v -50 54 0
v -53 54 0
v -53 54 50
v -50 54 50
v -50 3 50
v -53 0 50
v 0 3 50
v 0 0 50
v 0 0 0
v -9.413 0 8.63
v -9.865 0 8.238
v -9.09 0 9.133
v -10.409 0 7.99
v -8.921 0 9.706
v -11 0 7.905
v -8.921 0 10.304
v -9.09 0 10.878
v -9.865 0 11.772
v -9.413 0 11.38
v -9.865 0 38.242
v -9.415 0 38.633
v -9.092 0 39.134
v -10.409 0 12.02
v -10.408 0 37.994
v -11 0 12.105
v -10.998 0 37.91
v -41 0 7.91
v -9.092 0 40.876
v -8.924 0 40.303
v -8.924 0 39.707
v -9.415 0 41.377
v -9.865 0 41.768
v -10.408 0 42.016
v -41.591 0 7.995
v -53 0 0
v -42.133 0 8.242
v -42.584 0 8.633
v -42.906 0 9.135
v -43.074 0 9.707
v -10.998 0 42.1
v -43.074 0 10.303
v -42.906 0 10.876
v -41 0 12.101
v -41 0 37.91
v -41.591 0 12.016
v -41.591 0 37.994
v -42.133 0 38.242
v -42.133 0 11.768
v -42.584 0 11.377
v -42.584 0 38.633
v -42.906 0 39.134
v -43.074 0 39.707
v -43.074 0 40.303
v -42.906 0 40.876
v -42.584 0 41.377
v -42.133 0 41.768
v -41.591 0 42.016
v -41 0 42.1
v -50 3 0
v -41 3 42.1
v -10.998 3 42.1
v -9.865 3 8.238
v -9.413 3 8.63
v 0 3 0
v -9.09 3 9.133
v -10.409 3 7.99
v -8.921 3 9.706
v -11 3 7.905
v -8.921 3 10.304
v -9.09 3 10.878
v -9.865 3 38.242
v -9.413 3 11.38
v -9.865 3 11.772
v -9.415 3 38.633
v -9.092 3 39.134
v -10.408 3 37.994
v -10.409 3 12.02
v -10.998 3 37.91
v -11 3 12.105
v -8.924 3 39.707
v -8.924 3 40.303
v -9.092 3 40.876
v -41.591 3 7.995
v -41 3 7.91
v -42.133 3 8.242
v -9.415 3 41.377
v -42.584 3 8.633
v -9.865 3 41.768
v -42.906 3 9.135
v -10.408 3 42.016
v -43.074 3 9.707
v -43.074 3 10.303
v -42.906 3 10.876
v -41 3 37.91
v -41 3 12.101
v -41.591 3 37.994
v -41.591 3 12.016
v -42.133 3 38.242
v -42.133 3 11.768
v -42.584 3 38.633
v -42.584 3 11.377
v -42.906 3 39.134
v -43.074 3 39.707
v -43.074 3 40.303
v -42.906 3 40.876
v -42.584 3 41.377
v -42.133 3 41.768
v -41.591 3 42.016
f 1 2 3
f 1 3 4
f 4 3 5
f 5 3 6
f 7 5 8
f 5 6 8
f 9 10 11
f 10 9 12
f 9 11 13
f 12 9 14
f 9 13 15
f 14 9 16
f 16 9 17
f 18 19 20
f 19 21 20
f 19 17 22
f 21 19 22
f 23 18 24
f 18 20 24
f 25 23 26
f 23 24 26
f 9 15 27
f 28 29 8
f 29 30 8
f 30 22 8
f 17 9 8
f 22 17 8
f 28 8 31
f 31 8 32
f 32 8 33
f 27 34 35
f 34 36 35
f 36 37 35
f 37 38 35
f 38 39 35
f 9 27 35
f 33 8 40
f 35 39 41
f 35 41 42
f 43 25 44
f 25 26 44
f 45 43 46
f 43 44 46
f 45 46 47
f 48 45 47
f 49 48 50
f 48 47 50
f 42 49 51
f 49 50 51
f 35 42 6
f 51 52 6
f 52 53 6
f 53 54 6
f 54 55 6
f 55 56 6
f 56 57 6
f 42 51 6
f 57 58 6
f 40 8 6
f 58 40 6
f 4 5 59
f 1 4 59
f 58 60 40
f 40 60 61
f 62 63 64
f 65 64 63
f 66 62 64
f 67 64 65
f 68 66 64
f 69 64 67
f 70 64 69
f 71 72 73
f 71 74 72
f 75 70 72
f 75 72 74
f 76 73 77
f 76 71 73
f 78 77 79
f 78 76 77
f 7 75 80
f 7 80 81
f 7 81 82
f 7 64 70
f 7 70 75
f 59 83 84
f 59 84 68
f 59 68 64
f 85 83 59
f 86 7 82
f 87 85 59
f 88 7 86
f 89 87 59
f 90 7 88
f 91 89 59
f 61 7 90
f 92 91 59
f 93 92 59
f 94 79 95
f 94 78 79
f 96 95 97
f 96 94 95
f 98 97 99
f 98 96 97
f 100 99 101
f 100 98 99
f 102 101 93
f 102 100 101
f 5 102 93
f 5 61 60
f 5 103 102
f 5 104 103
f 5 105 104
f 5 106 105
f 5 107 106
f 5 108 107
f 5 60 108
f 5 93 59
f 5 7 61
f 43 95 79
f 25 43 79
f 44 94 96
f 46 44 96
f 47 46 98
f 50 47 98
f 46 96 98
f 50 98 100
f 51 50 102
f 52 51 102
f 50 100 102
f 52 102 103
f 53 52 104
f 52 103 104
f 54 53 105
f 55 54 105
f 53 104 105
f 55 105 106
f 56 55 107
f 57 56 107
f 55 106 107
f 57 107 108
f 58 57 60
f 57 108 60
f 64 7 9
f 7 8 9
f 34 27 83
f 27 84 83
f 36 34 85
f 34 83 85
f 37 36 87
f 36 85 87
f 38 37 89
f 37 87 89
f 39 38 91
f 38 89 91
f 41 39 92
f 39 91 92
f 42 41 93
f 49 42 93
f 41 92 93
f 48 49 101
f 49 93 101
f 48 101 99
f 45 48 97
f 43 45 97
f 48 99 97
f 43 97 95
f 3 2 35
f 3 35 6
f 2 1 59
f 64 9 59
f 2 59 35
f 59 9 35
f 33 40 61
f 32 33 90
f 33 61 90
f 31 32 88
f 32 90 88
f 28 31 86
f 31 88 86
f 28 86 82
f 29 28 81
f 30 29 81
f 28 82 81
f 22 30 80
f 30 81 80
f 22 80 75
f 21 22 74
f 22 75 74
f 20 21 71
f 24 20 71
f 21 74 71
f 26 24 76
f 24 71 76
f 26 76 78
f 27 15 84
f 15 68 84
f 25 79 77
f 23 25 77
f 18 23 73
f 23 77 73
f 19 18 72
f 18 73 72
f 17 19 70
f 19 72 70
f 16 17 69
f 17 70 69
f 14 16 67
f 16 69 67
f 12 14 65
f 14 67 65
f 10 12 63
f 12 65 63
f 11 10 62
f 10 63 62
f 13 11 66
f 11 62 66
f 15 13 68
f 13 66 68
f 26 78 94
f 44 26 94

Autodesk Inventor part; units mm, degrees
ref_plane "YZ Plane" through (0, 0, 0) normal (1, 0, 0) x (0, 1, 0)
ref_plane "XZ Plane" through (0, 0, 0) normal (0, 1, 0) x (-1, 0, 0)
ref_plane "XY Plane" through (0, 0, 0) normal (0, 0, 1) x (1, 0, 0)
sketch "Sketch1" plane through (0, 0, 0) normal (0, 1, 0) x (-1, 0, 0)
  line L0 (0, 0) -> (52.9999, 0)
  line L1 (52.9999, 0) -> (52.9999, 49.9999)
  line L2 (52.9999, 49.9999) -> (0, 49.9999)
  line L3 (0, 49.9999) -> (0, 0)
  dimension "d0" = 52.9999
  dimension "d1" = 49.9999
extrude "Extrusion1" add sketch "Sketch1" along normal blind 3
sketch "Sketch2" plane through (0, 3, 0) normal (0, 1, 0) x (1, 0, 0)
  line L0 (-52.9999, 0) -> (-52.9999, -49.9999) projected
  line L1 (0, 0) -> (-52.9999, 0) projected
  line L2 (-52.9999, -49.9999) -> (-49.9999, -49.9999)
  line L3 (-49.9999, -49.9999) -> (-49.9999, 0)
  line L4 (-49.9999, 0) -> (-52.9999, 0)
  line L5 (-52.9999, 0) -> (-52.9999, -49.9999)
  dimension "d4" = 3
extrude "Extrusion2" add sketch "Sketch2" along normal blind 50.9999
sketch "Sketch3" plane through (0, 3, 0) normal (0, 1, 0) x (1, 0, 0)
  line L0 (0, -49.9999) -> (0, 0) projected
  line L1 (0, -10.0051) -> (-11, -10.0051)
  circle A0 centre (-11, -10.0051) radius 2.1
  line L2 (-11, -10.0051) -> (-40.9999, -10.0051)
  circle A1 centre (-40.9999, -10.0051) radius 2.0955
  line L3 (-41.0003, -12.1006) -> (-11.0003, -12.1051)
  line L4 (-11.0003, -7.9051) -> (-41.0003, -7.9096)
  line L5 (0, -40.005) -> (-10.9982, -40.005)
  circle A2 centre (-10.9982, -40.005) radius 2.0955
  circle A3 centre (-41.0003, -40.005) radius 2.0955
  line L6 (-41.0003, -42.1005) -> (-10.9982, -42.1005)
  line L7 (-10.9982, -37.9095) -> (-41.0003, -37.9095)
  line L8 (-49.9999, -49.9999) -> (0, -49.9999) projected
  line L9 (0, 0) -> (-49.9999, 0) projected
  dimension "d7" = 11
  dimension "d8" = 4.2
  dimension "d9" = 29.9999
  dimension "d10" = 4.191
  dimension "d11" = 10.9982
  dimension "d12" = 4.191
  dimension "d13" = 4.191
  dimension "d14" = 29.9999
  dimension "d15" = 9.9949
  dimension "d16" = 10.0051
extrude "Extrusion3" cut sketch "Sketch3" against normal blind 12.5001
properties part number "Nema 3 Mounting"
